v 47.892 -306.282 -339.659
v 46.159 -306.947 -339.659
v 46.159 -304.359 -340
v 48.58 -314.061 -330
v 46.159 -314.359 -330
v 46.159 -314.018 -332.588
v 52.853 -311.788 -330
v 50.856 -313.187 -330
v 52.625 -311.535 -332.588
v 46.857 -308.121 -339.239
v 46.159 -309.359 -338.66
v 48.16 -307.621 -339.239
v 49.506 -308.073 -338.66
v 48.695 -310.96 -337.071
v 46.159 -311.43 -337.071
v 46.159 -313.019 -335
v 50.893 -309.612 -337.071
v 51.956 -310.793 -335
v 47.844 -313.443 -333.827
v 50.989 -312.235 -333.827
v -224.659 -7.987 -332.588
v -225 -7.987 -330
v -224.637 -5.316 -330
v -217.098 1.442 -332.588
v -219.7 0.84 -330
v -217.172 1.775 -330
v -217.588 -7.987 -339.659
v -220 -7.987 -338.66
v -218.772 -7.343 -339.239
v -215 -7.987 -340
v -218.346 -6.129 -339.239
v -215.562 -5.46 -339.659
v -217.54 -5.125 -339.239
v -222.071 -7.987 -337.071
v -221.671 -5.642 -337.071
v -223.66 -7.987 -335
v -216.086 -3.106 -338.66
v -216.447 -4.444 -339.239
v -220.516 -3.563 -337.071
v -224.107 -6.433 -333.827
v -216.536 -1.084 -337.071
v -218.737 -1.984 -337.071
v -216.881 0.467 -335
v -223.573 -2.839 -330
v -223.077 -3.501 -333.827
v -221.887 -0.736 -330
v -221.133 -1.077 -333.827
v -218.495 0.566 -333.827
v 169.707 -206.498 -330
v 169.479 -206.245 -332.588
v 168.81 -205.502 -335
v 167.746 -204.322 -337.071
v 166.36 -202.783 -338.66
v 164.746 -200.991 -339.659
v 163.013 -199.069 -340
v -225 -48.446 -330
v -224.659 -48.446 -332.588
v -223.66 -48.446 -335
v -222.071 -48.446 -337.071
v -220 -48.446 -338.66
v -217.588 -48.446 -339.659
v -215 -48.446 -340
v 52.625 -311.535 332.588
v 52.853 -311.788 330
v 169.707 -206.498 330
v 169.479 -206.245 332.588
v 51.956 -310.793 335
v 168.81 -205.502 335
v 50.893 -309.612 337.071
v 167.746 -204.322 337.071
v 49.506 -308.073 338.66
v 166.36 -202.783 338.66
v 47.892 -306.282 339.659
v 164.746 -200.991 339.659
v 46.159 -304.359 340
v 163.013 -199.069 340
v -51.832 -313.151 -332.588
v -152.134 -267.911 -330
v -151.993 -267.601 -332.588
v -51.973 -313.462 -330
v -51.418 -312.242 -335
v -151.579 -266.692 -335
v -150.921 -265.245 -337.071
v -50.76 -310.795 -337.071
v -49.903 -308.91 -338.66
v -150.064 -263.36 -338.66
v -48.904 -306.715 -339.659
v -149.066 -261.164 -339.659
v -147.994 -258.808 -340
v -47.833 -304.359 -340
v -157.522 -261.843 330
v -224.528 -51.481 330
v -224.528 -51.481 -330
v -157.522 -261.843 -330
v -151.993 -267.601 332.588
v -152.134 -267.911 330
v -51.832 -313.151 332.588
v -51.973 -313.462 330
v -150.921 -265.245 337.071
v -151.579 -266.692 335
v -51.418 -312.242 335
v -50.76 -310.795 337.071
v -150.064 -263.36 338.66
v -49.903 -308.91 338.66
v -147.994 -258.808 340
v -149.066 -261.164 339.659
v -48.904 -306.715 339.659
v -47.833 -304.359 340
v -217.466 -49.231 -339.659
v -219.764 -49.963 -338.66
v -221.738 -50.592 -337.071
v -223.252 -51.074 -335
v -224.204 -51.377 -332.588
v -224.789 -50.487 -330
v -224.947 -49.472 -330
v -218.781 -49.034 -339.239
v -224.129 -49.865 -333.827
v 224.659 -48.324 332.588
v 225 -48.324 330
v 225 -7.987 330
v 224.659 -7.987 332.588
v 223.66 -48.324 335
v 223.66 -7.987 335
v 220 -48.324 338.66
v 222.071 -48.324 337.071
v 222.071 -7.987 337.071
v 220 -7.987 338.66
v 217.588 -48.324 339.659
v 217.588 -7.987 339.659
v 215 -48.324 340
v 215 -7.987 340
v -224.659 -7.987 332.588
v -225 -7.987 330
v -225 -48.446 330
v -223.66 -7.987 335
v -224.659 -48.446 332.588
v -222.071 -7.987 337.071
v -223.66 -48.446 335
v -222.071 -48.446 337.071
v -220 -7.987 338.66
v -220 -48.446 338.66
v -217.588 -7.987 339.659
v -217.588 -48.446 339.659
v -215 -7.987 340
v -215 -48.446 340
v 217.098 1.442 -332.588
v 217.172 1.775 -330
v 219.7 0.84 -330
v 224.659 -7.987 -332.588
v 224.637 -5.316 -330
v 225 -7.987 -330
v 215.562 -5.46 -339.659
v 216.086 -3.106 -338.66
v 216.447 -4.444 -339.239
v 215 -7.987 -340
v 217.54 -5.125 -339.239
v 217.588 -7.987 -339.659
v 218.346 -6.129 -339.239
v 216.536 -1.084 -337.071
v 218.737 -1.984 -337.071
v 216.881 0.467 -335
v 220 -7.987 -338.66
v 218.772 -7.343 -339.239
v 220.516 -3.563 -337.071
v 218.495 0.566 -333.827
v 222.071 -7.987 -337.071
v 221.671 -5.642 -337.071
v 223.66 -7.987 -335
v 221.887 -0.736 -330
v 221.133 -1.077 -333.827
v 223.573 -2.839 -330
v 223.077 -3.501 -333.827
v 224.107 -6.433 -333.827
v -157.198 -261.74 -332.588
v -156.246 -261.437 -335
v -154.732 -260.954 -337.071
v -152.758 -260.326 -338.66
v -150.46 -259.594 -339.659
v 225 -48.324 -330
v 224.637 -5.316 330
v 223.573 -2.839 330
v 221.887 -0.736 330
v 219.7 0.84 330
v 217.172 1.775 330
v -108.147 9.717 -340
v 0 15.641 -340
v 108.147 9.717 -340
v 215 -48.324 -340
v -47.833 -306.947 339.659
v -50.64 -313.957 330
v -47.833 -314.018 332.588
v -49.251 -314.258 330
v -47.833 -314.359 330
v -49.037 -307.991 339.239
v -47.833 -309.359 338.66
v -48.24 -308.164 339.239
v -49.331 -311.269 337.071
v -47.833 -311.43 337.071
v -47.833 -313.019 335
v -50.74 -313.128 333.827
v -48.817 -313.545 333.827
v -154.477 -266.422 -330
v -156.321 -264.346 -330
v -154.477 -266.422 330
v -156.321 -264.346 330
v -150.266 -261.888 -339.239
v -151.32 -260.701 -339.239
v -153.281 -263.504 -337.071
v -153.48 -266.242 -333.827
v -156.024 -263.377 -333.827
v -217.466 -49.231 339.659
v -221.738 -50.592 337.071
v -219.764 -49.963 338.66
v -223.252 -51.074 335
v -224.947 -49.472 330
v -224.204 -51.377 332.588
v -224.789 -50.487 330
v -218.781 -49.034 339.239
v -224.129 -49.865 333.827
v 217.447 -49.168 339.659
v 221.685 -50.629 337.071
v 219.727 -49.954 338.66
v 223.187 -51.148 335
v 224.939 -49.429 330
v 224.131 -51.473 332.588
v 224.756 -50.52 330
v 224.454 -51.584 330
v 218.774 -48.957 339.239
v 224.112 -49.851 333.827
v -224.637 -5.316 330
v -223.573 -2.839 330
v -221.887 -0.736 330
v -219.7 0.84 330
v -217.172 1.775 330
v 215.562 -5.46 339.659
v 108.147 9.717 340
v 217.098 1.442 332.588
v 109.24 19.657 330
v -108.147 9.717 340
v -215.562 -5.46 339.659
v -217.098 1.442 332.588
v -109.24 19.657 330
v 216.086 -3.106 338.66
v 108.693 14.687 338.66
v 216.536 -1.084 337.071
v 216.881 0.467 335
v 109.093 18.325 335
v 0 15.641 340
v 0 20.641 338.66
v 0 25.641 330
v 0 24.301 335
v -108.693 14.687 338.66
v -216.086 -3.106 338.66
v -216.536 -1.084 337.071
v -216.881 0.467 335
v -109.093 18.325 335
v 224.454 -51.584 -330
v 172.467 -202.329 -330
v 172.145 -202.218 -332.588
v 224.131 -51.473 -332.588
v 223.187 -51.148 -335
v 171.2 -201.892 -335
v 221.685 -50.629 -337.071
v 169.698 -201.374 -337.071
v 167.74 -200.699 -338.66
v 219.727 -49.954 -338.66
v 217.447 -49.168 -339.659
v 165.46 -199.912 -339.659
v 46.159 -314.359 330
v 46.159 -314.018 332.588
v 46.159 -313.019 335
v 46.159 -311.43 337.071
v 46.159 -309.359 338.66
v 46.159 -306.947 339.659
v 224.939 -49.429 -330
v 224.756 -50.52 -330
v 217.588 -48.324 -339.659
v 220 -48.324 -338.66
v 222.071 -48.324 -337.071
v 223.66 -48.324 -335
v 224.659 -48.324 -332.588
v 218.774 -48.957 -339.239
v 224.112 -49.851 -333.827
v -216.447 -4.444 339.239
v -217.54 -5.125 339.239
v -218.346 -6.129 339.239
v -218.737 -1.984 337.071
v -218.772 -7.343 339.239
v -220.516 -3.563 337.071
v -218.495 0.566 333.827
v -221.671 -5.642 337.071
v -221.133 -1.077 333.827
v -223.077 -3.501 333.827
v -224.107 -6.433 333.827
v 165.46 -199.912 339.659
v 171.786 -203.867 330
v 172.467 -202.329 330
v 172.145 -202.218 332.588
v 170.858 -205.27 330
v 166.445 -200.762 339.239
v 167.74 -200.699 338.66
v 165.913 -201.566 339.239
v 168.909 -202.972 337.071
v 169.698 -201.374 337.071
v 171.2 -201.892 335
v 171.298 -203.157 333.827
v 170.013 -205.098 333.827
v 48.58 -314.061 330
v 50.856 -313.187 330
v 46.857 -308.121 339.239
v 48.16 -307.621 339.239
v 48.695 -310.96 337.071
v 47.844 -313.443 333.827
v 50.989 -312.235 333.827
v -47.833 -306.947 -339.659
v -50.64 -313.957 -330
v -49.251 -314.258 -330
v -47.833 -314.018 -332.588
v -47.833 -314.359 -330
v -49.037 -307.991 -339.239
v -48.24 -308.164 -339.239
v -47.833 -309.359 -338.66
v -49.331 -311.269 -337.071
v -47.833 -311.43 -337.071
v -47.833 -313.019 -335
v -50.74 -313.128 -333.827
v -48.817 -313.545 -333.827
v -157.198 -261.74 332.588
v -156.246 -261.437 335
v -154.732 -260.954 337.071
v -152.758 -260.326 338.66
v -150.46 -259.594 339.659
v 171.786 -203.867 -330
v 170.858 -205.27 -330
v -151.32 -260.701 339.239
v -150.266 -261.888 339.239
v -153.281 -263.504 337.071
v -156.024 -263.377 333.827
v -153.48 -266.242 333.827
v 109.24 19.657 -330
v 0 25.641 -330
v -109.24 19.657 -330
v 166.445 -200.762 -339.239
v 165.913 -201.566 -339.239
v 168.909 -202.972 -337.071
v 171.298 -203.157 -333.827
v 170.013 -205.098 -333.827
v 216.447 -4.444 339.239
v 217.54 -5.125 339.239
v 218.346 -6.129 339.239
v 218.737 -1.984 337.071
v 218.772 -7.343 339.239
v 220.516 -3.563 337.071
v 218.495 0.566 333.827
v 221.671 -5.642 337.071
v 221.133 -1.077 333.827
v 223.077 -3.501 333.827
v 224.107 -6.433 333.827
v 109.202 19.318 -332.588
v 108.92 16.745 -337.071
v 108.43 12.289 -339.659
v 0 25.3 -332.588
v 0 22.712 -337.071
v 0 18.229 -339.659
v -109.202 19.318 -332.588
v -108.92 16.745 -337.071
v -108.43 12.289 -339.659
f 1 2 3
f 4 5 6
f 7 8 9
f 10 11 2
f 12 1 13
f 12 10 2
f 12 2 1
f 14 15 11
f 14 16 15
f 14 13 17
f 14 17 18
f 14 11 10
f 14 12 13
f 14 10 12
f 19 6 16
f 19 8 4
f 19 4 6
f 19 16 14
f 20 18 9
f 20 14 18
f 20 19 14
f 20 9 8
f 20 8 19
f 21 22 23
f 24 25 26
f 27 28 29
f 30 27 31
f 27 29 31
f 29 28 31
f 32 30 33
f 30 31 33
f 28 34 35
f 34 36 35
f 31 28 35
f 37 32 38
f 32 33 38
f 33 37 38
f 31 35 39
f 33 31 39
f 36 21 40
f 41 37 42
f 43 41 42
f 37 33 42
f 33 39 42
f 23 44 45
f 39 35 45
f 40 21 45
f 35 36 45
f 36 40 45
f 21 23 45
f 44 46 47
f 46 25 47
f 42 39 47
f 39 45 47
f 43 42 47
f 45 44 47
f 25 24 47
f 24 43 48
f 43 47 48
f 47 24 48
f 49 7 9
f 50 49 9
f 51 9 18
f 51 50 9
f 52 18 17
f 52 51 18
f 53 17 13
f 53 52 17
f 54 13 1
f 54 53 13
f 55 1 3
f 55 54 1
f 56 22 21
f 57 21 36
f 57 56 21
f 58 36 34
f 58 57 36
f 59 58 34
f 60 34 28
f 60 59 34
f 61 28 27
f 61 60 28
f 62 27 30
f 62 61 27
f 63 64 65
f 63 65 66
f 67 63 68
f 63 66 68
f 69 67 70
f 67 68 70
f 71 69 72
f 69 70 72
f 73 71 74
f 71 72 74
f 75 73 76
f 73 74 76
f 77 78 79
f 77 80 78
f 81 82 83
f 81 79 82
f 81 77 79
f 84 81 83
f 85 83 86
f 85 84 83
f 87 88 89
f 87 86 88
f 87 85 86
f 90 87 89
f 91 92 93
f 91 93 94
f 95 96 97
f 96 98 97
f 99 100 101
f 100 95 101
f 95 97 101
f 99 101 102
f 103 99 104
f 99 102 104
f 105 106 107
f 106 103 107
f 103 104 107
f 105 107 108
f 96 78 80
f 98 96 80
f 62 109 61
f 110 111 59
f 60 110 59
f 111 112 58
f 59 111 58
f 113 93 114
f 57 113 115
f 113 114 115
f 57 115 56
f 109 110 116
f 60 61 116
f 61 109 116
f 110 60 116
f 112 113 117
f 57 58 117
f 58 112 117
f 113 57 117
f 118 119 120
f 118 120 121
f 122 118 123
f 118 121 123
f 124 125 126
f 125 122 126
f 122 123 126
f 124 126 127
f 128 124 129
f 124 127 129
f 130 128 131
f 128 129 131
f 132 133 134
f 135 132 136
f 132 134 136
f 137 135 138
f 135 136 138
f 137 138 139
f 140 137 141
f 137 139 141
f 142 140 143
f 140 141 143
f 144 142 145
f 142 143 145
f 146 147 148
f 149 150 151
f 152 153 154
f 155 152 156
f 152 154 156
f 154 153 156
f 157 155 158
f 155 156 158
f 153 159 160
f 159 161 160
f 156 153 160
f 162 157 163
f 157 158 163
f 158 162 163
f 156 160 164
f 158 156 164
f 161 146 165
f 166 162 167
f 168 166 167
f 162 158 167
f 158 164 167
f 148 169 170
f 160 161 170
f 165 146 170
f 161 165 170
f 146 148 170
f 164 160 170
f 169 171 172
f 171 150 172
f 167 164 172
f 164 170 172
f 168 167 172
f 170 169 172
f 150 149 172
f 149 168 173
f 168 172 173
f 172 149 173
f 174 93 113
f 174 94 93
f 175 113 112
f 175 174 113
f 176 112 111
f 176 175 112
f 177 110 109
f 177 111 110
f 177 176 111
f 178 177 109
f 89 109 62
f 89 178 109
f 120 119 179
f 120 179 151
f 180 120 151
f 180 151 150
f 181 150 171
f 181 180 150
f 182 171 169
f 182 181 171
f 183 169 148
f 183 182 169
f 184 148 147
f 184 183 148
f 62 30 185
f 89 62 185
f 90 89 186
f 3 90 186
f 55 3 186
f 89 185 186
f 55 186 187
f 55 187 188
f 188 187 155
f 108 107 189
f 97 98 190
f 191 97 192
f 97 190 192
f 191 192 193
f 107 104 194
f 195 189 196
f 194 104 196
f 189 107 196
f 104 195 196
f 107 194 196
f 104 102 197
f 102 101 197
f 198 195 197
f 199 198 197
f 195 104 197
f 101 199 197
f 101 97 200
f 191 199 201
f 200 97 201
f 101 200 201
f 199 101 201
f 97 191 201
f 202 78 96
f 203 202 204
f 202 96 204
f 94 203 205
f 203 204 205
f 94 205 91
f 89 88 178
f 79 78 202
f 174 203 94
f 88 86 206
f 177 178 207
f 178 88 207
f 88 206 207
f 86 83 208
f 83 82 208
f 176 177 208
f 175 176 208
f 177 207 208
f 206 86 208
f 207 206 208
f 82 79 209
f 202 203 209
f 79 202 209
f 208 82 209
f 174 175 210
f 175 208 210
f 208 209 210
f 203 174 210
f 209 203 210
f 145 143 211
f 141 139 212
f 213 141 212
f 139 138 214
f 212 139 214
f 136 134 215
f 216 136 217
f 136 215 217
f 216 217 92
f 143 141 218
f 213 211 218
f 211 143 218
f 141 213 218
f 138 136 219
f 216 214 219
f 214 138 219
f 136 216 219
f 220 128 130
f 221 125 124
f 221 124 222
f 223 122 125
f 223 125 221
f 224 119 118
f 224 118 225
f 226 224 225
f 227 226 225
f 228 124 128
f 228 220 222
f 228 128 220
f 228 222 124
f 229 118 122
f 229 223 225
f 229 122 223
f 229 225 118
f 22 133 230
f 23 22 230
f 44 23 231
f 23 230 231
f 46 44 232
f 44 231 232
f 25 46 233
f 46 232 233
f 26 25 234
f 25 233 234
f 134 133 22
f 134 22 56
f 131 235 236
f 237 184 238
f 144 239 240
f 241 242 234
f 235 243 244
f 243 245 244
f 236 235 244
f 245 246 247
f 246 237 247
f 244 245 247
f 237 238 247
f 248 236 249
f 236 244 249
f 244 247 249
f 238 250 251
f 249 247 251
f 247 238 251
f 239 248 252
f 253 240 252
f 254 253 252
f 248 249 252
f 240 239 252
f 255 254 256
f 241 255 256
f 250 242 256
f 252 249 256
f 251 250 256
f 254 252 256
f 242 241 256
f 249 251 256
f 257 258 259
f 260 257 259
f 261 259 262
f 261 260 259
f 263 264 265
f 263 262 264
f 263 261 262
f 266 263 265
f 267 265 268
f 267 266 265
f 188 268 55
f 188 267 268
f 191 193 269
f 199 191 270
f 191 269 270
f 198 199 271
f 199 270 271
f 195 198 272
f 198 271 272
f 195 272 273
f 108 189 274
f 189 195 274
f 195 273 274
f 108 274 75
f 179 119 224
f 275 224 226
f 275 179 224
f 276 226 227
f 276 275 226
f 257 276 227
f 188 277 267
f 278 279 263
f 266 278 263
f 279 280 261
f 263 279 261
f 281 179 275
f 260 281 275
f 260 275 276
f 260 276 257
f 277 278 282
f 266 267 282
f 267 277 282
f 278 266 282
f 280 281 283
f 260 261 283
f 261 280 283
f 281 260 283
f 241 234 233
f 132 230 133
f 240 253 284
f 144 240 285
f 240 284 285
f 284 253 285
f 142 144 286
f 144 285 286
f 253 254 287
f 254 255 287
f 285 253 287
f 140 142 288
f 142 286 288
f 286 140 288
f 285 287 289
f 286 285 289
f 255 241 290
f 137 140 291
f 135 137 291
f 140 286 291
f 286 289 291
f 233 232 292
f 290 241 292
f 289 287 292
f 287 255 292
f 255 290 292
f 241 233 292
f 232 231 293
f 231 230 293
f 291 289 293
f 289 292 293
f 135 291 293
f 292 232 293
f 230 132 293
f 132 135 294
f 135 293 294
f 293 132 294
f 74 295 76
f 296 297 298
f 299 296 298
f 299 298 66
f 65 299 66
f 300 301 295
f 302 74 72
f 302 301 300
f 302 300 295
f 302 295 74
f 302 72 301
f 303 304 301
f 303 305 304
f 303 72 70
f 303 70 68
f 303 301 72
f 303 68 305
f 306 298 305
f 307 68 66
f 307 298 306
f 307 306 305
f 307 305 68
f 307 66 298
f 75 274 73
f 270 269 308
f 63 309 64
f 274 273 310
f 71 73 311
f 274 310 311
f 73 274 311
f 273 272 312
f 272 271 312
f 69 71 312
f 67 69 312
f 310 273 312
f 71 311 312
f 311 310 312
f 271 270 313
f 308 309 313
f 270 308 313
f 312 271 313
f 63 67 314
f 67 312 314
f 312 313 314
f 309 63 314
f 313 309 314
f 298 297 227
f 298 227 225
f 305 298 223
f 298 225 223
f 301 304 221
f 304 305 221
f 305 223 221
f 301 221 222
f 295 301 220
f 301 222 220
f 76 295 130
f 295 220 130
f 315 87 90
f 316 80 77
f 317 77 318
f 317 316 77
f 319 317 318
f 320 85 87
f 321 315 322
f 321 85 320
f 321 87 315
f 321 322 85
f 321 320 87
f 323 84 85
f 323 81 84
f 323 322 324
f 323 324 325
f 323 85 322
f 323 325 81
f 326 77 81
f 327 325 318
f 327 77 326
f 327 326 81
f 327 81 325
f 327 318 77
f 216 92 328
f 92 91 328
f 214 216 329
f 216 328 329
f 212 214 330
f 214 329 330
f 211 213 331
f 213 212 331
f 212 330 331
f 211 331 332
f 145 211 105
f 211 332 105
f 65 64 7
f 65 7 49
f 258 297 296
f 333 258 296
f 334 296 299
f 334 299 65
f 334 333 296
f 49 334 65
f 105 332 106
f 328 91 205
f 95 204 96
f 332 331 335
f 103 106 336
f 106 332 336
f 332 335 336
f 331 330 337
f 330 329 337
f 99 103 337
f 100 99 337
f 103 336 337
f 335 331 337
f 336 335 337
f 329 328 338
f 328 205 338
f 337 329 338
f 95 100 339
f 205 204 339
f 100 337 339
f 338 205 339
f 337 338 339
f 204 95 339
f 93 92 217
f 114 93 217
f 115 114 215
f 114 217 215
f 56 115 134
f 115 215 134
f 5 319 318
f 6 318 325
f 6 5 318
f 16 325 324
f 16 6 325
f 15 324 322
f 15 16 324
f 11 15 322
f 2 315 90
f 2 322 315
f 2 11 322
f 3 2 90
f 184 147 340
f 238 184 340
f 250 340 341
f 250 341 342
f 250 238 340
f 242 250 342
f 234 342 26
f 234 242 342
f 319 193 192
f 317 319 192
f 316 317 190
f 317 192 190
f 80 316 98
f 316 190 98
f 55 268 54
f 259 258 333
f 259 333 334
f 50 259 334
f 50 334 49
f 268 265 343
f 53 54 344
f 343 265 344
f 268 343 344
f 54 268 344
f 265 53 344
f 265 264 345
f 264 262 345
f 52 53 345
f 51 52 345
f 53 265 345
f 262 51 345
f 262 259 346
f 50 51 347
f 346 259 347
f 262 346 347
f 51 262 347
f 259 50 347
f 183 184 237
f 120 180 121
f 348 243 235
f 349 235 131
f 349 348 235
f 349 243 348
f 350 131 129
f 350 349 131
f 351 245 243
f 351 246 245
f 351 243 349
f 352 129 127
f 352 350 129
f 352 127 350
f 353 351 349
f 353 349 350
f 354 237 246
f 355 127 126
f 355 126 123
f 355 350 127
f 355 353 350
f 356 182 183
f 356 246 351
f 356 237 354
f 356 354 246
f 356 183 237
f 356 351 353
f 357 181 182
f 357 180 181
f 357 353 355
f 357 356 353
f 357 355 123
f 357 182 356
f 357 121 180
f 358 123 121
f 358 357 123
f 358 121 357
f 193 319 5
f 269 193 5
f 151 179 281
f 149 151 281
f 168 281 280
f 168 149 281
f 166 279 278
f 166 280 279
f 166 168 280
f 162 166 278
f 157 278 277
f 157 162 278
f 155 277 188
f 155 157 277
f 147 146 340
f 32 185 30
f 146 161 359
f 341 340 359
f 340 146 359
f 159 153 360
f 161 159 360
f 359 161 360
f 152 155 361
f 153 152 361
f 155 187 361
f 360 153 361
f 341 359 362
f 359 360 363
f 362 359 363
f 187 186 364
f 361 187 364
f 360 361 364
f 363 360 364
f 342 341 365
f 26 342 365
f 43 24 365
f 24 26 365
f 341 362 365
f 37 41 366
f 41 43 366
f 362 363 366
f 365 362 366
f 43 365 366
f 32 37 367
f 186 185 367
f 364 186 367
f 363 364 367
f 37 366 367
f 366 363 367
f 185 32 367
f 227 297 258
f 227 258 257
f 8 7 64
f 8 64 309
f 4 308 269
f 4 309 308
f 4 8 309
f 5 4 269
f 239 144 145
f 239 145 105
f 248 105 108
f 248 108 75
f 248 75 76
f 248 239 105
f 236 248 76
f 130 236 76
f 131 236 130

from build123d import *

# Parameters (mm, degrees)
F1_DEPTH = 340
F2_R     = 10


with BuildPart() as f1:
    # F0 (on Top) → F1 (new body, symmetric)
    with BuildSketch(Plane.XY):
        with BuildLine():
            Line((225, -50), (225, 0))
            ThreePointArc((225, 0), (0, 25.641237), (-225, 0))
            Line((-225, 0), (-225, -50))
            Line((-225, -50), (-156.175058, -266.073386))
            Line((-156.175058, -266.073386), (-50, -314.358763))
            Line((-50, -314.358763), (50, -314.358763))
            Line((50, -314.358763), (171.62508, -204.769474))
            Line((171.62508, -204.769474), (225, -50))
        make_face()
    extrude(amount=F1_DEPTH, both=True)

    # F2
    f2_edges = [f1.edges().sort_by_distance(p)[0] for p in [
        (225, 0, 0),
        (0, 25.641237, -340),
        (-225, 0, 0),
        (0, 25.641237, 340),
        (-225, -25, -340),
        (-225, -50, 0),
        (-225, -25, 340),
        (-190.587529, -158.036693, -340),
        (-156.175058, -266.073386, 0),
        (-190.587529, -158.036693, 340),
        (225, -50, 0),
        (225, -25, -340),
        (225, -25, 340),
        (171.62508, -204.769474, 0),
        (198.31254, -127.384737, -340),
        (198.31254, -127.384737, 340),
        (110.81254, -259.564119, -340),
        (110.81254, -259.564119, 340),
        (50, -314.358763, 0),
        (0, -314.358763, -340),
        (0, -314.358763, 340),
        (-50, -314.358763, 0),
        (-103.087529, -290.216075, -340),
        (-103.087529, -290.216075, 340),
    ]]
    fillet(f2_edges, radius=F2_R)


solid = f1.part
